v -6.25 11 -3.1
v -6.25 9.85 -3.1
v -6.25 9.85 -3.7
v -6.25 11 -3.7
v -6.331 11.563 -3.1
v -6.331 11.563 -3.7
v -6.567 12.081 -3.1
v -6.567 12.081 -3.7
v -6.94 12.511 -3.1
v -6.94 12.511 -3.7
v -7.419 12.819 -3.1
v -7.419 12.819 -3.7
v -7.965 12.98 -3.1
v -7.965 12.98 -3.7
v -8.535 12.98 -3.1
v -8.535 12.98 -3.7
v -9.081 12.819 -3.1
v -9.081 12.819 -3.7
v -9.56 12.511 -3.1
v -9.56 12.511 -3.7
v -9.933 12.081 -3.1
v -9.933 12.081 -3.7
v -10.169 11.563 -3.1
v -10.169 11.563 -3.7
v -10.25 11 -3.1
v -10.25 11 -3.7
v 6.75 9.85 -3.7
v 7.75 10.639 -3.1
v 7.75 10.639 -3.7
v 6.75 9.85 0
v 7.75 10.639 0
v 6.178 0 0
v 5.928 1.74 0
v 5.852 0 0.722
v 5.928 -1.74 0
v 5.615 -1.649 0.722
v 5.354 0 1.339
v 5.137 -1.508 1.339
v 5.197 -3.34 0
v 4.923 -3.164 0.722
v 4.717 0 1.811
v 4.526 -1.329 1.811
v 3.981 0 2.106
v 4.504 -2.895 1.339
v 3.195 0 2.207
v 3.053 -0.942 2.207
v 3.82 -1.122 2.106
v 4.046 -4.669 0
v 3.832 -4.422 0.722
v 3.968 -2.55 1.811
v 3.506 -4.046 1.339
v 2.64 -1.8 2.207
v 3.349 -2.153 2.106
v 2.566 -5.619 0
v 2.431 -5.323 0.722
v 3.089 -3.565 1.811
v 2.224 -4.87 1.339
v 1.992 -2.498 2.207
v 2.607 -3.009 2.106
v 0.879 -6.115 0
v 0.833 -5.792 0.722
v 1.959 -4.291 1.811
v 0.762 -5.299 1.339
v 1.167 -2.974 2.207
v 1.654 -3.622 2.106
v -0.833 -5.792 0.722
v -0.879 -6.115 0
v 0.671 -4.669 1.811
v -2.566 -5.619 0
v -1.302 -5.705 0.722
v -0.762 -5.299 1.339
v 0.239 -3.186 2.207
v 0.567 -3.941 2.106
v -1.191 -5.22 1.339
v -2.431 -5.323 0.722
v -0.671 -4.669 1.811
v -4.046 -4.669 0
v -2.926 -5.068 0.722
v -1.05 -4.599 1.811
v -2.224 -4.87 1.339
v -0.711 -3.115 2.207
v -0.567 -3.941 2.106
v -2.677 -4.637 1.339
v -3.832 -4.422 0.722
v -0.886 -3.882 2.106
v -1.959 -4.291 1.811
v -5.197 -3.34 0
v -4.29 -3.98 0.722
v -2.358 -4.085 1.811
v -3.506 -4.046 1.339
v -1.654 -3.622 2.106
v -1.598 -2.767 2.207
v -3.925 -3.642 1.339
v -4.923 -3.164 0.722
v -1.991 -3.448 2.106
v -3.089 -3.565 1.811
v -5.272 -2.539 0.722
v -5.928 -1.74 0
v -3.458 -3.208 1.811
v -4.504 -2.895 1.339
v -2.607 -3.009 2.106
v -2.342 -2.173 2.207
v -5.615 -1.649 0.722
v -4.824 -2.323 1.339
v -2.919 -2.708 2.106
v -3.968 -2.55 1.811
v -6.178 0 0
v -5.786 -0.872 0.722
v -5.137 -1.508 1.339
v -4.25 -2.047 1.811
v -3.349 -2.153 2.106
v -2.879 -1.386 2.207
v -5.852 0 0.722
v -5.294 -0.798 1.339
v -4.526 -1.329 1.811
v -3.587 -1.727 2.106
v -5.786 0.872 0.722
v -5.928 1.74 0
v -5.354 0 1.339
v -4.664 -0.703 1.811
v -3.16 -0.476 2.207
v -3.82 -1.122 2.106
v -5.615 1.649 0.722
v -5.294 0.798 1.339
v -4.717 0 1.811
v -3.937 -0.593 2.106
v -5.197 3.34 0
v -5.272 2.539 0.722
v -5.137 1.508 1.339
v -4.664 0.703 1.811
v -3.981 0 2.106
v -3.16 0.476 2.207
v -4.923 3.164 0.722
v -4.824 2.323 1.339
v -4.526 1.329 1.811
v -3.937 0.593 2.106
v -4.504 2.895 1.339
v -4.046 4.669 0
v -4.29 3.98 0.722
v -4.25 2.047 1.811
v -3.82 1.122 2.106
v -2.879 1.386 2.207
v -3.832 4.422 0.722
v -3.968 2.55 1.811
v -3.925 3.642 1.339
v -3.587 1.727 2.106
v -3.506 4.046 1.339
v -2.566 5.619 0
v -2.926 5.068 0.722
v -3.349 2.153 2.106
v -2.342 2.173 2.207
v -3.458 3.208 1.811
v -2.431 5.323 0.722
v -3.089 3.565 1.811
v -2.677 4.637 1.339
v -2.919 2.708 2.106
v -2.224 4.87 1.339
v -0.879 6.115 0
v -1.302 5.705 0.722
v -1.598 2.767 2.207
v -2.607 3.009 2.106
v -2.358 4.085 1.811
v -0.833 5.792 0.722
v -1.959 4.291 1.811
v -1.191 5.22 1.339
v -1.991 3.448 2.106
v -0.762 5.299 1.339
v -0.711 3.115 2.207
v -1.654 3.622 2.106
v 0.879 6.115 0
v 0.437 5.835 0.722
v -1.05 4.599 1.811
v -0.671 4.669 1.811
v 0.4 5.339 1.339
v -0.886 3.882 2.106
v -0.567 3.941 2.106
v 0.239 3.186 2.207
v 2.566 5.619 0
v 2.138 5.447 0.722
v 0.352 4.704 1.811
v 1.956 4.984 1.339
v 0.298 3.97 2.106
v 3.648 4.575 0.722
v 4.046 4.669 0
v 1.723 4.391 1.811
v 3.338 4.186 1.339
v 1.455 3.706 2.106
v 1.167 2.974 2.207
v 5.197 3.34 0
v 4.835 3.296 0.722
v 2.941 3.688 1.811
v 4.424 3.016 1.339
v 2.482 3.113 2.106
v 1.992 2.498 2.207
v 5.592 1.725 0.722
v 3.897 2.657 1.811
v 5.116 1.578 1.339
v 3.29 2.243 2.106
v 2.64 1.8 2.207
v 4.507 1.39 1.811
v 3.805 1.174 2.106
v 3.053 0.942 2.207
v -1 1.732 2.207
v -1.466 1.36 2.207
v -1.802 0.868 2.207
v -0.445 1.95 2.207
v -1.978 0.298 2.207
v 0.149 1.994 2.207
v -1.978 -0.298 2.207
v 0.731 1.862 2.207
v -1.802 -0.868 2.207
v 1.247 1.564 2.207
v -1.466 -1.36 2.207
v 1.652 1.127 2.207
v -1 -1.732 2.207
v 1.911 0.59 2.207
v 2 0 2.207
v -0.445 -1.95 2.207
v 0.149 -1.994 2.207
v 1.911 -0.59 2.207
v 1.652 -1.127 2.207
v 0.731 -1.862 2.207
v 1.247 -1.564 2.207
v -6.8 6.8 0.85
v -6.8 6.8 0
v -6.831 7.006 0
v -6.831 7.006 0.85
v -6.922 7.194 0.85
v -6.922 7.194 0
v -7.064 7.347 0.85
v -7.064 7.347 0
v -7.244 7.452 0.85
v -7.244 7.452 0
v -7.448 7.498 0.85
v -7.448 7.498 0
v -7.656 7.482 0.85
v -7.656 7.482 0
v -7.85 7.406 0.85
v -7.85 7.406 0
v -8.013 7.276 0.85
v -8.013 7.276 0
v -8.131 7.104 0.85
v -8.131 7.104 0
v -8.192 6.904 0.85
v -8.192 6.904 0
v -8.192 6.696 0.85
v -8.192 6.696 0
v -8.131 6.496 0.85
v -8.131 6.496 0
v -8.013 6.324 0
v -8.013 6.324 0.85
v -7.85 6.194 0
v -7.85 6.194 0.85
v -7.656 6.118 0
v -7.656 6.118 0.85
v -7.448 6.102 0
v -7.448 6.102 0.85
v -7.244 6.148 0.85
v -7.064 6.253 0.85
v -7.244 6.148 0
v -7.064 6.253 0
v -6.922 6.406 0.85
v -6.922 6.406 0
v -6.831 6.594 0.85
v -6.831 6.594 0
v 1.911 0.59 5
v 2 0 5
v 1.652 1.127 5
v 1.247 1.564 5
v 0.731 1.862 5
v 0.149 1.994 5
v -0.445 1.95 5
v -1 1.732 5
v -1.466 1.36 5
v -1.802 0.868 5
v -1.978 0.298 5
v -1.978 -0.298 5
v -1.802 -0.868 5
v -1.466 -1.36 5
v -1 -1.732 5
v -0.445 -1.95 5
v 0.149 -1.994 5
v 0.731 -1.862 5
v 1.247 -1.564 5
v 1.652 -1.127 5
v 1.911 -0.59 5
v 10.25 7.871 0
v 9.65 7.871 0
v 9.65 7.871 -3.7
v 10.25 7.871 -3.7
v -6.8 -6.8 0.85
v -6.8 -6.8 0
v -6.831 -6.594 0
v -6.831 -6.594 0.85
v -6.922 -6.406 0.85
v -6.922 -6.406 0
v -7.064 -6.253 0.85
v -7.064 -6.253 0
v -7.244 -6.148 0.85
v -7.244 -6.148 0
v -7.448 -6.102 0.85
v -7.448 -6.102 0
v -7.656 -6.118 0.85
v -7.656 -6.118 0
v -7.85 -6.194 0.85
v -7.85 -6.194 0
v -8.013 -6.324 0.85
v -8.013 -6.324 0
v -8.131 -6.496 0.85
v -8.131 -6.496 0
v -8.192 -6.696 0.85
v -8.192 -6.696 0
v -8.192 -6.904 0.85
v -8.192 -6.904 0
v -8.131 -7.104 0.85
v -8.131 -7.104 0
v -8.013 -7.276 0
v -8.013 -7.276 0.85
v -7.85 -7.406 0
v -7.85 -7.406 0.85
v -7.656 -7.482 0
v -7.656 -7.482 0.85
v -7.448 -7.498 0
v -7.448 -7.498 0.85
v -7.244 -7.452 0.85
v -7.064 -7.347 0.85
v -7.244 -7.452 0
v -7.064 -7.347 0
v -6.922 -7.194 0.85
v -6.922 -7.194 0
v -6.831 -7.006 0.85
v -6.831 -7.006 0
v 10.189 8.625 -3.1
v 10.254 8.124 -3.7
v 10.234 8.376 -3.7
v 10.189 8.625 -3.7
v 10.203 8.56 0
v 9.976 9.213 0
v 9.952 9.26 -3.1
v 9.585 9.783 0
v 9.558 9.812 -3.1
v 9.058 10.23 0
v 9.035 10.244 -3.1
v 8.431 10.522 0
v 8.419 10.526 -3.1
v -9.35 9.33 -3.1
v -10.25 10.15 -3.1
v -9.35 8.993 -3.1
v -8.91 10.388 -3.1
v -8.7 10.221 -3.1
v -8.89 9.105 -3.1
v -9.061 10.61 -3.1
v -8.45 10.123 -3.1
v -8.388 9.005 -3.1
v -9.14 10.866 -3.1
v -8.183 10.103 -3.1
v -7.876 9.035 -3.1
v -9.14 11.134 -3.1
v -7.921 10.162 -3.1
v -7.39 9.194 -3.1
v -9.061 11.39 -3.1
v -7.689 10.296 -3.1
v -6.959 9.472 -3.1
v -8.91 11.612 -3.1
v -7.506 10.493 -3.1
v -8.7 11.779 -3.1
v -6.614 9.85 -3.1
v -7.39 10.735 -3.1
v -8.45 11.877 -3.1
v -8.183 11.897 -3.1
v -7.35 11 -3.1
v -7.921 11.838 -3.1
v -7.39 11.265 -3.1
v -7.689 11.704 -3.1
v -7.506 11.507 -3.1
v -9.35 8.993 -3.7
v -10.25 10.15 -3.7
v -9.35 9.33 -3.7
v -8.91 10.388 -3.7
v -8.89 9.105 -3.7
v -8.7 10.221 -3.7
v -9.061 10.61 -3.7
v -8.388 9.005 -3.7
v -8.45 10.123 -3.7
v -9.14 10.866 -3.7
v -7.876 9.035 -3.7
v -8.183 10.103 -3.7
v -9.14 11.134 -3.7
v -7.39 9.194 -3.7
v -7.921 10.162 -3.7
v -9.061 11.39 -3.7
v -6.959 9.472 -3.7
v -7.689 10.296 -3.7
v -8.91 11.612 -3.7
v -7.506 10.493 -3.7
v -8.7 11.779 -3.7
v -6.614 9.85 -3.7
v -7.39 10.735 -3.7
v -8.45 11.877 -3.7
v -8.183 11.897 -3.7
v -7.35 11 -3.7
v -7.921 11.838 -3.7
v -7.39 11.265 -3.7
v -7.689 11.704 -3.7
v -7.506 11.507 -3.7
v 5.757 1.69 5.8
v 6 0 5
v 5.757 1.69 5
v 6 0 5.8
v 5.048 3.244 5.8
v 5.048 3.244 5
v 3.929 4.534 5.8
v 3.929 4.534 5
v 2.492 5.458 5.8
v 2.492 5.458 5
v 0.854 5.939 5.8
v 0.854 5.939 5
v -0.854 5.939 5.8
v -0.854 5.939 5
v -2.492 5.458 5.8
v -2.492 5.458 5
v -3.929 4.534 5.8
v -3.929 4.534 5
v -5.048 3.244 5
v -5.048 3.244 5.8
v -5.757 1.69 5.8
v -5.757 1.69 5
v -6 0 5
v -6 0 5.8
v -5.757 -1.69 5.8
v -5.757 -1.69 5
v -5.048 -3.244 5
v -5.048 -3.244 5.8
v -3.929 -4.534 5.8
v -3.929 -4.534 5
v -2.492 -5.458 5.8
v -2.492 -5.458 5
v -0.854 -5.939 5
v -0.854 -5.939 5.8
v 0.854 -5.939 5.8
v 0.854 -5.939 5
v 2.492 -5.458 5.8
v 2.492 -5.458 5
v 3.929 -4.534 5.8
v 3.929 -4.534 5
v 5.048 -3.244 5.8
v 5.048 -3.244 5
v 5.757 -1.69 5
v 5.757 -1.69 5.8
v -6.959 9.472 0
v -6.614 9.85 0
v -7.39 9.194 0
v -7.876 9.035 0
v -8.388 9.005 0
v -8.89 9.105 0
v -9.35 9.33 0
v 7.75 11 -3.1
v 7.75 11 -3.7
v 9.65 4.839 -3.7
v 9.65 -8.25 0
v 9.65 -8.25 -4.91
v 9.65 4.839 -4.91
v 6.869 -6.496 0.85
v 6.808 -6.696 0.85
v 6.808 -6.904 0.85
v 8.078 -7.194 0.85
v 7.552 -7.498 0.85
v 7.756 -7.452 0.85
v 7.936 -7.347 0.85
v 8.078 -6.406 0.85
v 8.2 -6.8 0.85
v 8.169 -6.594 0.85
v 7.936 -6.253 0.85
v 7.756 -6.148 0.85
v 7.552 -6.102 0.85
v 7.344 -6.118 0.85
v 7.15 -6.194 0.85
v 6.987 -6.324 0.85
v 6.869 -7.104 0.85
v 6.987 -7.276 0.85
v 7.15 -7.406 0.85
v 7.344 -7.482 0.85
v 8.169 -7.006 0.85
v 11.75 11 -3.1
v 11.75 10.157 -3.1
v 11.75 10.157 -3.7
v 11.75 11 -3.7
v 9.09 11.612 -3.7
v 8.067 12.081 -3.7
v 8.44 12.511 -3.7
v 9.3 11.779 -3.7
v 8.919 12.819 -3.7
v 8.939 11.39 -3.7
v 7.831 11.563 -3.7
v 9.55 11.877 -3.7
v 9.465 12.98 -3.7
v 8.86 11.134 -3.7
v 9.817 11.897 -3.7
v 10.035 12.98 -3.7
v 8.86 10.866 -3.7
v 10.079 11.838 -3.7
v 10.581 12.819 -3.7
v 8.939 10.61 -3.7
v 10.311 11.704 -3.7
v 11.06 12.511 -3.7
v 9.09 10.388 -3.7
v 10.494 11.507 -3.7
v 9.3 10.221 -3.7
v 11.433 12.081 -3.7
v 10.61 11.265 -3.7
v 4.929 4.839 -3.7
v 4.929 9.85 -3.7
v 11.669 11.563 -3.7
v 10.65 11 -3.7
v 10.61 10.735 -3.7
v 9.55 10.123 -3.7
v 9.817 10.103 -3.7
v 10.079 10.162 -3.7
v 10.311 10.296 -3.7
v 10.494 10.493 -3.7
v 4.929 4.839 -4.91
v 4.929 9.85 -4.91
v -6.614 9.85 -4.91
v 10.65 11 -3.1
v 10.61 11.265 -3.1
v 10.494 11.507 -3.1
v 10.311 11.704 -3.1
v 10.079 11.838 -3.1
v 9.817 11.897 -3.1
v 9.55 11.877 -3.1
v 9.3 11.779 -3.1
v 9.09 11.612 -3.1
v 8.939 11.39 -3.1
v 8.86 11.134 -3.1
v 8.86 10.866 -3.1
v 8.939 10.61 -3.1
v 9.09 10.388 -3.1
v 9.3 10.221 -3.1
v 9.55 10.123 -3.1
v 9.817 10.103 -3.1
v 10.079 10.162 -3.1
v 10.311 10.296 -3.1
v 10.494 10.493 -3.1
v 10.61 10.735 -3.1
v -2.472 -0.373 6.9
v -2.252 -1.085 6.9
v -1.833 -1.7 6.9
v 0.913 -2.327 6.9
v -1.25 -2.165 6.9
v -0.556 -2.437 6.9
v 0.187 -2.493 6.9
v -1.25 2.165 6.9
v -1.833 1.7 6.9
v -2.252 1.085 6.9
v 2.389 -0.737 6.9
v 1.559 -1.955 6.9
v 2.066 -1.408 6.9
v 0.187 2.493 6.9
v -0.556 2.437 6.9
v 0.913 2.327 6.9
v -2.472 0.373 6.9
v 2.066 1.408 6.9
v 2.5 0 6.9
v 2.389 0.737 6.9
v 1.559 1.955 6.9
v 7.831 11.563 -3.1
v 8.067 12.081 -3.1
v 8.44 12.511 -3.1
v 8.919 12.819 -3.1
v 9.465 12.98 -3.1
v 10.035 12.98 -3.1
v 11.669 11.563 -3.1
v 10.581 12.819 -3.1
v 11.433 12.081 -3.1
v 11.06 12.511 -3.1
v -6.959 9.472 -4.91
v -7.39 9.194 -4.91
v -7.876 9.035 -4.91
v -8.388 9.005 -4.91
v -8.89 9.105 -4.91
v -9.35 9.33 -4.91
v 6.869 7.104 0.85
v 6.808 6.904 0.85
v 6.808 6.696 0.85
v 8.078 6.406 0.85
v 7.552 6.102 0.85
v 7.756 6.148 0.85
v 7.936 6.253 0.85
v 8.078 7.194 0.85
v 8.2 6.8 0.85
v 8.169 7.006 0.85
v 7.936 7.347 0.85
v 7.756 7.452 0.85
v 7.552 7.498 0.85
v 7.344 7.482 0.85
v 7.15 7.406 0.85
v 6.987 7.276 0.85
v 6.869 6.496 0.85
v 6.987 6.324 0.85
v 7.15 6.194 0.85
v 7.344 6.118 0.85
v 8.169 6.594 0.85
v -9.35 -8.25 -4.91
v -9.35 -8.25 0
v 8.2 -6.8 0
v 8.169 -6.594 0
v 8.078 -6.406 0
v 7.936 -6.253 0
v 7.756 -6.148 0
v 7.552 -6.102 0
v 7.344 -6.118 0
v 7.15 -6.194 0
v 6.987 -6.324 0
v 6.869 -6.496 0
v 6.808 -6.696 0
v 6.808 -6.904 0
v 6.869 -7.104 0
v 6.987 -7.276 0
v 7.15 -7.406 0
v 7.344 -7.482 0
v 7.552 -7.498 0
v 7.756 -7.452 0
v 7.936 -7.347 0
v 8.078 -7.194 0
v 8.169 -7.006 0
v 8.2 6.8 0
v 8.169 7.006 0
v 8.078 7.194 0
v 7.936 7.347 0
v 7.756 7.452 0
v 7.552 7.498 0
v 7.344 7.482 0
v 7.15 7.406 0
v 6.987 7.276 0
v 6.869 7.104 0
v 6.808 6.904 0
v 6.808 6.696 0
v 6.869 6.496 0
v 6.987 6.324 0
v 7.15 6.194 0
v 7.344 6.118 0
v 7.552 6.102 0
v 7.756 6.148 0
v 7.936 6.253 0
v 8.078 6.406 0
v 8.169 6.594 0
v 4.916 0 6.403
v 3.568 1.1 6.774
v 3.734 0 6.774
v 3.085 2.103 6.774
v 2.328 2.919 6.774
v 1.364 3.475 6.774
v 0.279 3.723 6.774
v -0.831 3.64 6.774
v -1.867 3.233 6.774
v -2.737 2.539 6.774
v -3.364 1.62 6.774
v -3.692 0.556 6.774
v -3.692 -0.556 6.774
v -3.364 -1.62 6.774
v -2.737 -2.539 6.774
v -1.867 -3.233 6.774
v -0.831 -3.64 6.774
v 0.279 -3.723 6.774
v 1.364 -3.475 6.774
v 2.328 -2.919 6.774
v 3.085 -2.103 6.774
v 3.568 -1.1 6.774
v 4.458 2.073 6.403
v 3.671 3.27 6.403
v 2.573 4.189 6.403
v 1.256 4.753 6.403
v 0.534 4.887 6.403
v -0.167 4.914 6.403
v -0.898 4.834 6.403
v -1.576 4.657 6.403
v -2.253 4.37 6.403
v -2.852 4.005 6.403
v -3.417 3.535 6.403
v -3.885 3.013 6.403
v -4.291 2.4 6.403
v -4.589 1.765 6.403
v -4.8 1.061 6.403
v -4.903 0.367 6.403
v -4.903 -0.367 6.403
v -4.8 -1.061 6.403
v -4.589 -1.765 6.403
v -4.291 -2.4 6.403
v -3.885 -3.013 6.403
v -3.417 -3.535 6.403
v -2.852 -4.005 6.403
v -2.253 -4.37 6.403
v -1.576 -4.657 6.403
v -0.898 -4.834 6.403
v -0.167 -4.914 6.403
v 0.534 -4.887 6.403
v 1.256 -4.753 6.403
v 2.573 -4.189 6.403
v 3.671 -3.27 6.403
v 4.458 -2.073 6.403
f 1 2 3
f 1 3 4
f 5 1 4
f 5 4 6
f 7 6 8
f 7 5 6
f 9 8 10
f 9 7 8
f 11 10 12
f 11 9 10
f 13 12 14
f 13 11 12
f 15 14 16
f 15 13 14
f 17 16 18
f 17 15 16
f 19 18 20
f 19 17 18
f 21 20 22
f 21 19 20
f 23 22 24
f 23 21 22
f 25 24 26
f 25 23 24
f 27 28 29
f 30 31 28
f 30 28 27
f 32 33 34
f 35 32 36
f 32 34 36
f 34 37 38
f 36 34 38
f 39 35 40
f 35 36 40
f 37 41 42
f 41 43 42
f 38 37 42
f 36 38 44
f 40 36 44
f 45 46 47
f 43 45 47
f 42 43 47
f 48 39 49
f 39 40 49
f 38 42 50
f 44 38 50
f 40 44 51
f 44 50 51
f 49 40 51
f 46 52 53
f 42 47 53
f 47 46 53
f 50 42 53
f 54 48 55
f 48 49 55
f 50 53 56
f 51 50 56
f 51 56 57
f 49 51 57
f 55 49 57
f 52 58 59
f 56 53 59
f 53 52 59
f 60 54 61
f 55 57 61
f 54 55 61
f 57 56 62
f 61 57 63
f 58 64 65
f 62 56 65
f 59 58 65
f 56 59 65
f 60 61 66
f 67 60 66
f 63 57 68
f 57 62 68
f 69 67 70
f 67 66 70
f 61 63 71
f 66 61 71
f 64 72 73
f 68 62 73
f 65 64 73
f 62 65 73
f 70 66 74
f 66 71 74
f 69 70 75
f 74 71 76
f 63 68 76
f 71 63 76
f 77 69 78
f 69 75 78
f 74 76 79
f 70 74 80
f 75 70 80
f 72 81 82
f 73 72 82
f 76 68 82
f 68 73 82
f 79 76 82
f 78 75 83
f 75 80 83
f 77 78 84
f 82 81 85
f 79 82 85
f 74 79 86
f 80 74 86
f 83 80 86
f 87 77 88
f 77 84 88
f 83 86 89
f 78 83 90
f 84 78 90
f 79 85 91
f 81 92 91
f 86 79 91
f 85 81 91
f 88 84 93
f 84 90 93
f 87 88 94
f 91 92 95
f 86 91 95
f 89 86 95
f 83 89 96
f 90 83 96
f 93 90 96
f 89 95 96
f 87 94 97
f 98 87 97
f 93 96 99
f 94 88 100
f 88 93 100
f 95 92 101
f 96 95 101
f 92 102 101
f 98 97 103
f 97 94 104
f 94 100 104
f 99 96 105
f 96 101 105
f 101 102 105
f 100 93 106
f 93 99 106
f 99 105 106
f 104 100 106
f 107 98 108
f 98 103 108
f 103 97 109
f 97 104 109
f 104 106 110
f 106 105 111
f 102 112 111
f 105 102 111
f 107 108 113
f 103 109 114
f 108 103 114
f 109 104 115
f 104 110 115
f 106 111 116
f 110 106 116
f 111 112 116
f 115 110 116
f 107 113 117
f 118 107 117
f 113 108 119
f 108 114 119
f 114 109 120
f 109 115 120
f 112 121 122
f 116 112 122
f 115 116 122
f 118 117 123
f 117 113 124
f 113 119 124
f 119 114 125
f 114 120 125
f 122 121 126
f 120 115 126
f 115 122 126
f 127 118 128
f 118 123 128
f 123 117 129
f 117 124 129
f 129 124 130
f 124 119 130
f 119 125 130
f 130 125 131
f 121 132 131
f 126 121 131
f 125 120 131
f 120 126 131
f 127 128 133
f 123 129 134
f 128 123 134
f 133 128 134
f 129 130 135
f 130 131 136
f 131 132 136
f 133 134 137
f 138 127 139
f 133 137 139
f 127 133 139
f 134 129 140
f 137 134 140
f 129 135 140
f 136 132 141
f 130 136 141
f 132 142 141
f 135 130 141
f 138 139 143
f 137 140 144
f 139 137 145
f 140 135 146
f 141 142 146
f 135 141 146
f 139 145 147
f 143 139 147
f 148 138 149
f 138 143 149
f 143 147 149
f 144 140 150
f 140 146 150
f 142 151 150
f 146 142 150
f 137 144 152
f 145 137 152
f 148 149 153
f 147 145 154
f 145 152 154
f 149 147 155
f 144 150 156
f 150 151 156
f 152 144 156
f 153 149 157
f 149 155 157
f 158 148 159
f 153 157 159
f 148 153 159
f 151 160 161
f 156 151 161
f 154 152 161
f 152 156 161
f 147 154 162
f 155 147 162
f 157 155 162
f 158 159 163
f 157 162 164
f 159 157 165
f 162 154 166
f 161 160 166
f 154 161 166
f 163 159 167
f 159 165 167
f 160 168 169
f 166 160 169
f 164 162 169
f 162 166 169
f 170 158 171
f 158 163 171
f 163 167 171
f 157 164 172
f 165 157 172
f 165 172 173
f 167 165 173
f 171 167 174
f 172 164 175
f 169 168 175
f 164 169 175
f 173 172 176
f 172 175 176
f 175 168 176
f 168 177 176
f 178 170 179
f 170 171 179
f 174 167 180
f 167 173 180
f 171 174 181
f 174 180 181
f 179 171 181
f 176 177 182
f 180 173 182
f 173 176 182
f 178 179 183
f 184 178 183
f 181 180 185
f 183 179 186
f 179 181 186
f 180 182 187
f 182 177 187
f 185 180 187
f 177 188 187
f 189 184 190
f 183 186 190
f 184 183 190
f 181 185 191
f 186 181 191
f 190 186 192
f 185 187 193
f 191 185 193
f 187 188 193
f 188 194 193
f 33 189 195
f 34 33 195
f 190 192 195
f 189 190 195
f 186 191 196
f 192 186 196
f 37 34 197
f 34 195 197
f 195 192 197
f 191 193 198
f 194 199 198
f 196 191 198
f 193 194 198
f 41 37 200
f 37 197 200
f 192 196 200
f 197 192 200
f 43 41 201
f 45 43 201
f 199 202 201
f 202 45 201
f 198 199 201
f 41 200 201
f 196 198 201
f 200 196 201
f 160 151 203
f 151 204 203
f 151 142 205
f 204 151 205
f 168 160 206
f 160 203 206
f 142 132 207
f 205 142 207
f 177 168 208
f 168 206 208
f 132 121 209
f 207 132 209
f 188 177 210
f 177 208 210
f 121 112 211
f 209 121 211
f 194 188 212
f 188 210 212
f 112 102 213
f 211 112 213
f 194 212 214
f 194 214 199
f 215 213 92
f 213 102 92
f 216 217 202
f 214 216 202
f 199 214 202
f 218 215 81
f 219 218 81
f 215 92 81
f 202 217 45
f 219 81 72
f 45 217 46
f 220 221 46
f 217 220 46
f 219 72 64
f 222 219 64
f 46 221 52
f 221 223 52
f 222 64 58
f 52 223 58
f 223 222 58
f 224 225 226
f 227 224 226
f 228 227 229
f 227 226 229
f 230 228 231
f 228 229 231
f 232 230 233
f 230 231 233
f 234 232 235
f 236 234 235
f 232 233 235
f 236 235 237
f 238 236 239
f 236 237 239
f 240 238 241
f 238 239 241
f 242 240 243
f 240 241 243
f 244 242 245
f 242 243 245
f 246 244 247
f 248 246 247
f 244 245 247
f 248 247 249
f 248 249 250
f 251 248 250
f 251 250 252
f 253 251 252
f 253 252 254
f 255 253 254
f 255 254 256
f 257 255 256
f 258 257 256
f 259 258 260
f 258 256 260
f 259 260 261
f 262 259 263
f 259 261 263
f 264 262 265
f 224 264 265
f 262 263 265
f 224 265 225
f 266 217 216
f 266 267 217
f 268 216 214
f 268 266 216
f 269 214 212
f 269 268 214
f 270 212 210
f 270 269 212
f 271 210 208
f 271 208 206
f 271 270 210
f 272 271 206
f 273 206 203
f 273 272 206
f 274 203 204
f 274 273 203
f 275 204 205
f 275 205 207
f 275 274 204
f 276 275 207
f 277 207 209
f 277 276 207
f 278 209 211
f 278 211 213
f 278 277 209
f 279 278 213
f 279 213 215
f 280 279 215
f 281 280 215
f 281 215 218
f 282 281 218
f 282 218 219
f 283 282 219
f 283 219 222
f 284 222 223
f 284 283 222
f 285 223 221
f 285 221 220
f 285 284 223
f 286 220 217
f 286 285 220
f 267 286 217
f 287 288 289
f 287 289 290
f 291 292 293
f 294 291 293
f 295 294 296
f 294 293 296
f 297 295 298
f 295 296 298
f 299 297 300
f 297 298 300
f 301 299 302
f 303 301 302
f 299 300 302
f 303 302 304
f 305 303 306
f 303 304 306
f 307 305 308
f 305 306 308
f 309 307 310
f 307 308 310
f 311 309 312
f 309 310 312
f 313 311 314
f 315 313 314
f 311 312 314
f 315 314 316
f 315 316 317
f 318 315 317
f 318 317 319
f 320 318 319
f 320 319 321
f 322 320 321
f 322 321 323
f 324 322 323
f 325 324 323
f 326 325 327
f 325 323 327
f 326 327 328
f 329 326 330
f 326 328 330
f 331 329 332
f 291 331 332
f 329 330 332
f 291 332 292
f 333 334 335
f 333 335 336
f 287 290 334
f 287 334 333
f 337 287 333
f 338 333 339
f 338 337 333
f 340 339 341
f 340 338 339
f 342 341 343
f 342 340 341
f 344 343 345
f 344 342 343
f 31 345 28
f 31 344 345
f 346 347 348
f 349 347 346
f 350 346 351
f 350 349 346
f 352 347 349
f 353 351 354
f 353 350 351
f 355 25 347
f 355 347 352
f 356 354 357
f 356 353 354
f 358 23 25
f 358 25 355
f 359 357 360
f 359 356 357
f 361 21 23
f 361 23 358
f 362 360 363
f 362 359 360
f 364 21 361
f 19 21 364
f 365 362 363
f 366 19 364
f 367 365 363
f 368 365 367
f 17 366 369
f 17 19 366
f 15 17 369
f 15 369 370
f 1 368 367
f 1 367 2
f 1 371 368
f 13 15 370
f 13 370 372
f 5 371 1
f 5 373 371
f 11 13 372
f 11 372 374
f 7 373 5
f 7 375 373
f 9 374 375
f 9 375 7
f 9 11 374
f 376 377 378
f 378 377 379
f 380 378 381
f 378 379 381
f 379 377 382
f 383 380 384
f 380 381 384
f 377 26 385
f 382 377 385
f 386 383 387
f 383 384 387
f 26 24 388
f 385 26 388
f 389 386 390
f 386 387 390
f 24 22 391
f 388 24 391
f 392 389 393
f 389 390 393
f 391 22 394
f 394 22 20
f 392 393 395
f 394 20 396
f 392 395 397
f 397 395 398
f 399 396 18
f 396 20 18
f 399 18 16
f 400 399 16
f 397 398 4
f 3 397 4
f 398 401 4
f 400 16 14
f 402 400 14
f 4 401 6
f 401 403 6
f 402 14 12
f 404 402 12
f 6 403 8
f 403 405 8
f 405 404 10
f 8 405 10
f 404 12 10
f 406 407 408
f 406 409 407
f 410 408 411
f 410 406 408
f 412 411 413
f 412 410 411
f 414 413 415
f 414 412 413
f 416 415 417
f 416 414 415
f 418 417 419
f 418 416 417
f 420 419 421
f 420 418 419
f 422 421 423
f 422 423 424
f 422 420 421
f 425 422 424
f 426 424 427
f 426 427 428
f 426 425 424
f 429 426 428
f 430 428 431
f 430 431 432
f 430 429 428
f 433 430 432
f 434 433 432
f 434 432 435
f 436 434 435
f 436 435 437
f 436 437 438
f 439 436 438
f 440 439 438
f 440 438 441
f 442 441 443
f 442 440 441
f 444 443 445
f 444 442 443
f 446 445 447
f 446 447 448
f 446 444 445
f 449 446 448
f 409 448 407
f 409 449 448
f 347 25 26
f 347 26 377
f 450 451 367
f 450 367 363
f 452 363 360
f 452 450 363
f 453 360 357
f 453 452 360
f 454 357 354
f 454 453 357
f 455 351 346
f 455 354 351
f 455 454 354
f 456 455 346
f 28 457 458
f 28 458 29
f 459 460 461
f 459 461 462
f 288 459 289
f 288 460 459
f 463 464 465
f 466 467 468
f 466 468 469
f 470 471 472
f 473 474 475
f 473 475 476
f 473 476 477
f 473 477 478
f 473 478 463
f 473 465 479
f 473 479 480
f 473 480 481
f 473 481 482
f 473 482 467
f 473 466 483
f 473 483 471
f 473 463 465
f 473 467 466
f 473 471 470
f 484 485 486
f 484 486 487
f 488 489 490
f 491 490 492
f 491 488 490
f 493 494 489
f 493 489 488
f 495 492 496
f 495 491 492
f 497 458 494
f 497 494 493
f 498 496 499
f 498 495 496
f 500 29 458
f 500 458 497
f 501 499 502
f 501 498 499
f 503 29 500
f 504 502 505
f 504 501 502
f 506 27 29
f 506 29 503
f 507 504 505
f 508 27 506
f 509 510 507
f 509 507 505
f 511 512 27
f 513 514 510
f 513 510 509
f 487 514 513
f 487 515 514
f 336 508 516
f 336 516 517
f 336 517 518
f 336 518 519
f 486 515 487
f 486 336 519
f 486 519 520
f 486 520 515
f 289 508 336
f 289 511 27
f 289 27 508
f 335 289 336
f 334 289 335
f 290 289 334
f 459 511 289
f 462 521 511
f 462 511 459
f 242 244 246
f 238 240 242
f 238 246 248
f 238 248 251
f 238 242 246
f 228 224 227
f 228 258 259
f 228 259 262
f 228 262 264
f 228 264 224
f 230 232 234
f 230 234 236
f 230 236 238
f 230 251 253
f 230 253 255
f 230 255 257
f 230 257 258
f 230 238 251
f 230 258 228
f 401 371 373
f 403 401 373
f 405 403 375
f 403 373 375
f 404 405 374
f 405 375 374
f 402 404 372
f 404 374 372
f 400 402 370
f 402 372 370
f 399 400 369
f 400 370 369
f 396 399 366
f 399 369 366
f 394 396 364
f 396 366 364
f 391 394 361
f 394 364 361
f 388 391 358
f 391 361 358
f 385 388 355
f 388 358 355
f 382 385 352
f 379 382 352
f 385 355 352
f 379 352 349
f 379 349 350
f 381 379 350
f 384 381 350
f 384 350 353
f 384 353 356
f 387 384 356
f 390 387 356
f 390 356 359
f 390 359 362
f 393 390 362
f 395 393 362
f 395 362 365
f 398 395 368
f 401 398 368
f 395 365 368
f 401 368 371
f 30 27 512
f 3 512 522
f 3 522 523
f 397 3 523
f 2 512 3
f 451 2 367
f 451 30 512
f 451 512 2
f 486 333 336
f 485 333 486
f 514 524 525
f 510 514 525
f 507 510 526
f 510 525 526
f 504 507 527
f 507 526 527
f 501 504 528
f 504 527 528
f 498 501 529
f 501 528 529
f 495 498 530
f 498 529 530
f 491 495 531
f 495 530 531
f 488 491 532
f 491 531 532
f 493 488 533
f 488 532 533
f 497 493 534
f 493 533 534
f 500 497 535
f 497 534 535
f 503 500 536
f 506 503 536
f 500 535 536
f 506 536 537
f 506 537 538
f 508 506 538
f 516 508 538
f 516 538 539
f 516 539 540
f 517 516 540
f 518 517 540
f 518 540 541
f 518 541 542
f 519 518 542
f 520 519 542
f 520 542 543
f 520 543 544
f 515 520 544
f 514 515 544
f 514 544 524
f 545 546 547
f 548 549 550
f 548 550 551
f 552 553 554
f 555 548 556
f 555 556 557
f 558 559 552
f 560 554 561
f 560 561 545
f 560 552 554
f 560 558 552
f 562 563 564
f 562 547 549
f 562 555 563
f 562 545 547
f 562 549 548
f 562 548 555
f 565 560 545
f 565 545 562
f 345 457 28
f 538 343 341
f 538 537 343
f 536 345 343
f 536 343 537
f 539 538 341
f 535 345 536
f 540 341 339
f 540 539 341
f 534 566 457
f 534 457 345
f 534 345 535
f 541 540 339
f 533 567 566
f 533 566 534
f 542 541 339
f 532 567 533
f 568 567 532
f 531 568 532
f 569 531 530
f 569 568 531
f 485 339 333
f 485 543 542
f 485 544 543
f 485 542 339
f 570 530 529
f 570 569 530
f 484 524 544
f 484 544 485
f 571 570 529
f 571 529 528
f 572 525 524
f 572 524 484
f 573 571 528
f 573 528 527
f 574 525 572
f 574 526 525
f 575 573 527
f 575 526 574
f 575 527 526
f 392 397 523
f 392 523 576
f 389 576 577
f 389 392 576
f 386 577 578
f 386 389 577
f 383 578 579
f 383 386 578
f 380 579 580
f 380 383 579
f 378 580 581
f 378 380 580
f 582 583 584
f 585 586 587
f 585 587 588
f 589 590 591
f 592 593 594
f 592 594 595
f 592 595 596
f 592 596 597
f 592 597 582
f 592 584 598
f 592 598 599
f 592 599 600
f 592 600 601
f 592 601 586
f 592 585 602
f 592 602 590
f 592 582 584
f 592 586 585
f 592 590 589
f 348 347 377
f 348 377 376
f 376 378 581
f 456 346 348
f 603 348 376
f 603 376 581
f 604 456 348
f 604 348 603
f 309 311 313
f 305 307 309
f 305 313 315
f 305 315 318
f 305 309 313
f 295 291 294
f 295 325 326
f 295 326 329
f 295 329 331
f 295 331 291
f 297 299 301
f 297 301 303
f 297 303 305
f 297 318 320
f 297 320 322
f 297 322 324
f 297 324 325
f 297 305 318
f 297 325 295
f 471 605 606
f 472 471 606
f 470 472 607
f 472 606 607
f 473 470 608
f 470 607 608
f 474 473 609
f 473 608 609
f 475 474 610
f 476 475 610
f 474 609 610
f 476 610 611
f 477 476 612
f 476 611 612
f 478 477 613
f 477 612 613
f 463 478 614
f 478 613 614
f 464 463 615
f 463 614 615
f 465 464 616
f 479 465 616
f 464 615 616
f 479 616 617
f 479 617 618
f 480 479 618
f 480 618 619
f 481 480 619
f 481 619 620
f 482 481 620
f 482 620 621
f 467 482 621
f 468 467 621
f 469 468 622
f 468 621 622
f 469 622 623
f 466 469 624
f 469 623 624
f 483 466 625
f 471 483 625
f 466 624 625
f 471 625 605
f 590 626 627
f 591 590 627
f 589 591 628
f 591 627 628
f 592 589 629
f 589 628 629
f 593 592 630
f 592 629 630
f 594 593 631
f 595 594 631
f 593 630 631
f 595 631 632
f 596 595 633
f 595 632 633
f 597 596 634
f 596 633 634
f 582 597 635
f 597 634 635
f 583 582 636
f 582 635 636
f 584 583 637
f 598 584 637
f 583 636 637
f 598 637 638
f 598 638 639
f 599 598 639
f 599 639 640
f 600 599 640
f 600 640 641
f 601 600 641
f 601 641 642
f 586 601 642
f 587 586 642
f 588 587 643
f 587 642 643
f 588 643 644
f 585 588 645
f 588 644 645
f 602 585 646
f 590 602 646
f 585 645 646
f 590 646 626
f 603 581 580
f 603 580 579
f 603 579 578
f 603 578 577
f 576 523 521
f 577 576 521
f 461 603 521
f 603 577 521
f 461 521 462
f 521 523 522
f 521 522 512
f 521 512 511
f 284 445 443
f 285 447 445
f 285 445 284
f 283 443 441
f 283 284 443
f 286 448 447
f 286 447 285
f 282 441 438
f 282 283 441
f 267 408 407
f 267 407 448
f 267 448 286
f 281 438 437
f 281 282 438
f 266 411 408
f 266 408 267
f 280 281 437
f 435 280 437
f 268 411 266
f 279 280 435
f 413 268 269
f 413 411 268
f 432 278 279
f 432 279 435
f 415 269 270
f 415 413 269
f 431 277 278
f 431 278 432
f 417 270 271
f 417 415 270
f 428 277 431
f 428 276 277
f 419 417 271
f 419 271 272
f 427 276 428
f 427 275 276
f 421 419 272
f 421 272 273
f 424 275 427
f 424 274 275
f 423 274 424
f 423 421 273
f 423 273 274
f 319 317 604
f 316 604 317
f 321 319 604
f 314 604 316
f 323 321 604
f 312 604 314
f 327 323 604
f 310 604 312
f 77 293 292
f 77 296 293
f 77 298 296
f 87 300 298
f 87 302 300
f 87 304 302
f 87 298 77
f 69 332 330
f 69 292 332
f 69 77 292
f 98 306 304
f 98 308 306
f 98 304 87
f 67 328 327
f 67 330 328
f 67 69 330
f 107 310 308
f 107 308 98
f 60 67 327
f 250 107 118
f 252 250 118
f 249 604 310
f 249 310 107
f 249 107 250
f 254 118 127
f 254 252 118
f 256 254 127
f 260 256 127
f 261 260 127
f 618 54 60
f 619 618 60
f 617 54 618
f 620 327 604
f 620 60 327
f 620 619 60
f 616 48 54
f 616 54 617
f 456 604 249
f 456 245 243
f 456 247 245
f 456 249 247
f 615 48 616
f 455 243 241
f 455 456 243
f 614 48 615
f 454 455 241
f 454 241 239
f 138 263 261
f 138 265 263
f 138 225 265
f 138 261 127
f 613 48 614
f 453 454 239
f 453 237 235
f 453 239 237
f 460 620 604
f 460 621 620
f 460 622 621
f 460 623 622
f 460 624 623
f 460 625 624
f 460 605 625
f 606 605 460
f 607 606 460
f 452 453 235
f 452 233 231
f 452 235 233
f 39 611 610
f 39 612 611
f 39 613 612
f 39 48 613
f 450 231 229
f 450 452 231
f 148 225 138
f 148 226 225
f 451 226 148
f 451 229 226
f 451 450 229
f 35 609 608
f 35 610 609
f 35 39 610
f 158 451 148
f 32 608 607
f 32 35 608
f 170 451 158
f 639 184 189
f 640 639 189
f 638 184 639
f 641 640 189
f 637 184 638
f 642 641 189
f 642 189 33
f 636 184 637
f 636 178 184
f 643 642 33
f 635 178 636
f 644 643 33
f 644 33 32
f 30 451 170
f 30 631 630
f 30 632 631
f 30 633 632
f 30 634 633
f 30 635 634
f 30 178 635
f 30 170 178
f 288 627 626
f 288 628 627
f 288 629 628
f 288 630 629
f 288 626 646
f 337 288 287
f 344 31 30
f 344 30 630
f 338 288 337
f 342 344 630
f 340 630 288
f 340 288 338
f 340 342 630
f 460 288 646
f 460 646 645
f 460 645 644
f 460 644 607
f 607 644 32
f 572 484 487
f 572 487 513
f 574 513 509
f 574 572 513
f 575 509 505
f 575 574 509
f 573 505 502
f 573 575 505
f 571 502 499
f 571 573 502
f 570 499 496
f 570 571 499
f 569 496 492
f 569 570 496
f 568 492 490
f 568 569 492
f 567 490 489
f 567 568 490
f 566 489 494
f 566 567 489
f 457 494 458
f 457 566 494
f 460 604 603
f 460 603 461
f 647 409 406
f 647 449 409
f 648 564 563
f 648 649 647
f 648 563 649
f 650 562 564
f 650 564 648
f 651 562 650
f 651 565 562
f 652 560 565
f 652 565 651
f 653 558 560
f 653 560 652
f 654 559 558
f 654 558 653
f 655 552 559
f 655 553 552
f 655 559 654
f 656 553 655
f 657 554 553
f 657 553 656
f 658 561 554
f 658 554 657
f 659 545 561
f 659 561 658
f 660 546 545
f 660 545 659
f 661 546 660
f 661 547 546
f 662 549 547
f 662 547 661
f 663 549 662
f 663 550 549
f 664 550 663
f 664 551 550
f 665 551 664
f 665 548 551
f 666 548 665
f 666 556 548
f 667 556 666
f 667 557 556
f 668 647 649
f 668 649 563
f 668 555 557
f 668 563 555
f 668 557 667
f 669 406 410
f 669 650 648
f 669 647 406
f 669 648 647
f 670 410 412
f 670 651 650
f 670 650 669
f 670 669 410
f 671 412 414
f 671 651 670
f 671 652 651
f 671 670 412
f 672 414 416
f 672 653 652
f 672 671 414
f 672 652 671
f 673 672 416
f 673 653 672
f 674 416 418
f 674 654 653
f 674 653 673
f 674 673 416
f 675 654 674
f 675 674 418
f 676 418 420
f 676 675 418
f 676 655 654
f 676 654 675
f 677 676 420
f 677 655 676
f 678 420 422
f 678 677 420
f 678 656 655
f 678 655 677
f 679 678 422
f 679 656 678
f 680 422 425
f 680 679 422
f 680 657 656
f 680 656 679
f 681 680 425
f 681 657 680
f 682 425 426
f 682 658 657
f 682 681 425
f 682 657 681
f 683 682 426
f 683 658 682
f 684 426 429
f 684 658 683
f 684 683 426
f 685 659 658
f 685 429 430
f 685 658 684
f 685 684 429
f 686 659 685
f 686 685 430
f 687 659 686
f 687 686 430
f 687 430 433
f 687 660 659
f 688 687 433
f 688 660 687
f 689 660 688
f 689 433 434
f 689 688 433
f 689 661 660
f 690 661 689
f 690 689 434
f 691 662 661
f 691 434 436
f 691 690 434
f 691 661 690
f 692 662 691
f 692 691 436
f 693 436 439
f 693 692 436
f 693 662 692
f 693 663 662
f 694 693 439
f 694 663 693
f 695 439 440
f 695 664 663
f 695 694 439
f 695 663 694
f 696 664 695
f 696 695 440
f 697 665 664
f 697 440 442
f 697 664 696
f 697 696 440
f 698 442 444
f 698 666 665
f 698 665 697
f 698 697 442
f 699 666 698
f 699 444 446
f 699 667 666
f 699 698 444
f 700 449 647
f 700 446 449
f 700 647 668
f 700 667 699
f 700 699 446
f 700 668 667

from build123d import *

# Parameters (mm, degrees)
F1_DEPTH  = 4.91
F2_R      = 0.7
F3_DEPTH  = 0.85
F6_DEPTH  = 0.6
F7_R      = 0.9
F8_DEPTH  = 0.6
F11_R     = 2
F12_DEPTH = 4
F15_W     = 5.8206040412
F15_H     = 6.0758944601
F16_DEPTH = 1.21


with BuildPart() as f1:
    # F0 (on Top) → F1 (new body)
    with BuildSketch(Plane.XY):
        with BuildLine():
            Line((-9.35, 9.3296706912), (-9.35, -8.25))
            Line((-9.35, -8.25), (9.65, -8.25))
            Line((9.65, -8.25), (9.65, 7.8709153458))
            Line((9.65, 7.8709153458), (10.25, 7.8709153458))
            ThreePointArc((10.25, 7.8709153458), (9.5849645406, 9.7831678774), (7.75, 10.6386718467))
            Line((7.75, 10.6386718467), (6.75, 9.85))
            Line((6.75, 9.85), (-6.6136931828, 9.85))
            ThreePointArc((-6.6136931828, 9.85), (-7.8763800086, 9.0352078731), (-9.35, 9.3296706912))
        make_face()
    extrude(amount=-F1_DEPTH)

    # F2 (on face) → F3 (join)
    with BuildSketch(Plane.XY):
        with Locations((-7.5, -6.8)):
            Circle(F2_R)
        with Locations((7.5, -6.8)):
            Circle(F2_R)
        with Locations((-7.5, 6.8)):
            Circle(F2_R)
        with Locations((7.5, 6.8)):
            Circle(F2_R)
    extrude(amount=F3_DEPTH)

    # F5 (on offset) → F6 (join)
    with BuildSketch(Plane.XY.offset(-3.1)):
        with BuildLine():
            Line((-10.25, 10.1498657733), (-9.0825001077, 8.6487947561))
            Line((-9.0825001077, 8.6487947561), (-6.25, 8.6487947561))
            Line((-6.25, 8.6487947561), (-6.25, 11))
            ThreePointArc((-6.25, 11), (-8.25, 13), (-10.25, 11))
            Line((-10.25, 11), (-10.25, 10.1498657733))
        make_face()
        with BuildLine():
            Line((7.75, 11), (7.75, 8.4319217131))
            Line((7.75, 8.4319217131), (9.9920006469, 8.4319217131))
            Line((9.9920006469, 8.4319217131), (11.75, 10.1568773389))
            Line((11.75, 10.1568773389), (11.75, 11))
            ThreePointArc((11.75, 11), (9.75, 13), (7.75, 11))
        make_face()
    extrude(amount=-F6_DEPTH)

    # F7 (on face) → F8 (cut, through all)
    with BuildSketch(Plane.XY.offset(-3.1)):
        with Locations((-8.25, 11)):
            Circle(F7_R)
        with Locations((9.75, 11)):
            Circle(F7_R)
    extrude(amount=-F8_DEPTH, mode=Mode.SUBTRACT)

    # F9 (on Front) → F10 (revolve)
    with BuildSketch(Plane.XZ):
        with BuildLine():
            Line((3.1952585559, 2.2070568521), (0, 2.2070568521))
            Line((0, 2.2070568521), (0, 0))
            Line((0, 0), (6.177762989, 0))
            ThreePointArc((6.177762989, 0), (5.0504157353, 1.5952910936), (3.1952585559, 2.2070568521))
        make_face()
    revolve(axis=Axis((0, 0, 1.103528426), (0, 0, -1)))

    # F11 (on face) → F12 (cut)
    with BuildSketch(Plane.XY.offset(2.2070568521)):
        Circle(F11_R)
    extrude(amount=-F12_DEPTH, mode=Mode.SUBTRACT)

    # F13 (on Front) → F14 (revolve)
    with BuildSketch(Plane.XZ):
        with BuildLine():
            Line((0, 6.9), (0, -2))
            Line((0, -2), (2, -2))
            Line((2, -2), (2, 5))
            Line((2, 5), (6, 5))
            Line((6, 5), (6, 5.8))
            ThreePointArc((6, 5.8), (4.3343936328, 6.6185251952), (2.5, 6.9))
            Line((2.5, 6.9), (0, 6.9))
        make_face()
    revolve(axis=Axis((0, 0, 2.45), (0, 0, 1)))

    # F15 (on face) → F16 (cut, through all)
    with BuildSketch(Plane(origin=(0, 0, -4.91), x_dir=(1, 0, 0), z_dir=(0, 0, -1))):
        with Locations((7.839627564, -7.8769084066)):
            Rectangle(F15_W, F15_H)
    extrude(amount=-F16_DEPTH, mode=Mode.SUBTRACT)


solid = f1.part
